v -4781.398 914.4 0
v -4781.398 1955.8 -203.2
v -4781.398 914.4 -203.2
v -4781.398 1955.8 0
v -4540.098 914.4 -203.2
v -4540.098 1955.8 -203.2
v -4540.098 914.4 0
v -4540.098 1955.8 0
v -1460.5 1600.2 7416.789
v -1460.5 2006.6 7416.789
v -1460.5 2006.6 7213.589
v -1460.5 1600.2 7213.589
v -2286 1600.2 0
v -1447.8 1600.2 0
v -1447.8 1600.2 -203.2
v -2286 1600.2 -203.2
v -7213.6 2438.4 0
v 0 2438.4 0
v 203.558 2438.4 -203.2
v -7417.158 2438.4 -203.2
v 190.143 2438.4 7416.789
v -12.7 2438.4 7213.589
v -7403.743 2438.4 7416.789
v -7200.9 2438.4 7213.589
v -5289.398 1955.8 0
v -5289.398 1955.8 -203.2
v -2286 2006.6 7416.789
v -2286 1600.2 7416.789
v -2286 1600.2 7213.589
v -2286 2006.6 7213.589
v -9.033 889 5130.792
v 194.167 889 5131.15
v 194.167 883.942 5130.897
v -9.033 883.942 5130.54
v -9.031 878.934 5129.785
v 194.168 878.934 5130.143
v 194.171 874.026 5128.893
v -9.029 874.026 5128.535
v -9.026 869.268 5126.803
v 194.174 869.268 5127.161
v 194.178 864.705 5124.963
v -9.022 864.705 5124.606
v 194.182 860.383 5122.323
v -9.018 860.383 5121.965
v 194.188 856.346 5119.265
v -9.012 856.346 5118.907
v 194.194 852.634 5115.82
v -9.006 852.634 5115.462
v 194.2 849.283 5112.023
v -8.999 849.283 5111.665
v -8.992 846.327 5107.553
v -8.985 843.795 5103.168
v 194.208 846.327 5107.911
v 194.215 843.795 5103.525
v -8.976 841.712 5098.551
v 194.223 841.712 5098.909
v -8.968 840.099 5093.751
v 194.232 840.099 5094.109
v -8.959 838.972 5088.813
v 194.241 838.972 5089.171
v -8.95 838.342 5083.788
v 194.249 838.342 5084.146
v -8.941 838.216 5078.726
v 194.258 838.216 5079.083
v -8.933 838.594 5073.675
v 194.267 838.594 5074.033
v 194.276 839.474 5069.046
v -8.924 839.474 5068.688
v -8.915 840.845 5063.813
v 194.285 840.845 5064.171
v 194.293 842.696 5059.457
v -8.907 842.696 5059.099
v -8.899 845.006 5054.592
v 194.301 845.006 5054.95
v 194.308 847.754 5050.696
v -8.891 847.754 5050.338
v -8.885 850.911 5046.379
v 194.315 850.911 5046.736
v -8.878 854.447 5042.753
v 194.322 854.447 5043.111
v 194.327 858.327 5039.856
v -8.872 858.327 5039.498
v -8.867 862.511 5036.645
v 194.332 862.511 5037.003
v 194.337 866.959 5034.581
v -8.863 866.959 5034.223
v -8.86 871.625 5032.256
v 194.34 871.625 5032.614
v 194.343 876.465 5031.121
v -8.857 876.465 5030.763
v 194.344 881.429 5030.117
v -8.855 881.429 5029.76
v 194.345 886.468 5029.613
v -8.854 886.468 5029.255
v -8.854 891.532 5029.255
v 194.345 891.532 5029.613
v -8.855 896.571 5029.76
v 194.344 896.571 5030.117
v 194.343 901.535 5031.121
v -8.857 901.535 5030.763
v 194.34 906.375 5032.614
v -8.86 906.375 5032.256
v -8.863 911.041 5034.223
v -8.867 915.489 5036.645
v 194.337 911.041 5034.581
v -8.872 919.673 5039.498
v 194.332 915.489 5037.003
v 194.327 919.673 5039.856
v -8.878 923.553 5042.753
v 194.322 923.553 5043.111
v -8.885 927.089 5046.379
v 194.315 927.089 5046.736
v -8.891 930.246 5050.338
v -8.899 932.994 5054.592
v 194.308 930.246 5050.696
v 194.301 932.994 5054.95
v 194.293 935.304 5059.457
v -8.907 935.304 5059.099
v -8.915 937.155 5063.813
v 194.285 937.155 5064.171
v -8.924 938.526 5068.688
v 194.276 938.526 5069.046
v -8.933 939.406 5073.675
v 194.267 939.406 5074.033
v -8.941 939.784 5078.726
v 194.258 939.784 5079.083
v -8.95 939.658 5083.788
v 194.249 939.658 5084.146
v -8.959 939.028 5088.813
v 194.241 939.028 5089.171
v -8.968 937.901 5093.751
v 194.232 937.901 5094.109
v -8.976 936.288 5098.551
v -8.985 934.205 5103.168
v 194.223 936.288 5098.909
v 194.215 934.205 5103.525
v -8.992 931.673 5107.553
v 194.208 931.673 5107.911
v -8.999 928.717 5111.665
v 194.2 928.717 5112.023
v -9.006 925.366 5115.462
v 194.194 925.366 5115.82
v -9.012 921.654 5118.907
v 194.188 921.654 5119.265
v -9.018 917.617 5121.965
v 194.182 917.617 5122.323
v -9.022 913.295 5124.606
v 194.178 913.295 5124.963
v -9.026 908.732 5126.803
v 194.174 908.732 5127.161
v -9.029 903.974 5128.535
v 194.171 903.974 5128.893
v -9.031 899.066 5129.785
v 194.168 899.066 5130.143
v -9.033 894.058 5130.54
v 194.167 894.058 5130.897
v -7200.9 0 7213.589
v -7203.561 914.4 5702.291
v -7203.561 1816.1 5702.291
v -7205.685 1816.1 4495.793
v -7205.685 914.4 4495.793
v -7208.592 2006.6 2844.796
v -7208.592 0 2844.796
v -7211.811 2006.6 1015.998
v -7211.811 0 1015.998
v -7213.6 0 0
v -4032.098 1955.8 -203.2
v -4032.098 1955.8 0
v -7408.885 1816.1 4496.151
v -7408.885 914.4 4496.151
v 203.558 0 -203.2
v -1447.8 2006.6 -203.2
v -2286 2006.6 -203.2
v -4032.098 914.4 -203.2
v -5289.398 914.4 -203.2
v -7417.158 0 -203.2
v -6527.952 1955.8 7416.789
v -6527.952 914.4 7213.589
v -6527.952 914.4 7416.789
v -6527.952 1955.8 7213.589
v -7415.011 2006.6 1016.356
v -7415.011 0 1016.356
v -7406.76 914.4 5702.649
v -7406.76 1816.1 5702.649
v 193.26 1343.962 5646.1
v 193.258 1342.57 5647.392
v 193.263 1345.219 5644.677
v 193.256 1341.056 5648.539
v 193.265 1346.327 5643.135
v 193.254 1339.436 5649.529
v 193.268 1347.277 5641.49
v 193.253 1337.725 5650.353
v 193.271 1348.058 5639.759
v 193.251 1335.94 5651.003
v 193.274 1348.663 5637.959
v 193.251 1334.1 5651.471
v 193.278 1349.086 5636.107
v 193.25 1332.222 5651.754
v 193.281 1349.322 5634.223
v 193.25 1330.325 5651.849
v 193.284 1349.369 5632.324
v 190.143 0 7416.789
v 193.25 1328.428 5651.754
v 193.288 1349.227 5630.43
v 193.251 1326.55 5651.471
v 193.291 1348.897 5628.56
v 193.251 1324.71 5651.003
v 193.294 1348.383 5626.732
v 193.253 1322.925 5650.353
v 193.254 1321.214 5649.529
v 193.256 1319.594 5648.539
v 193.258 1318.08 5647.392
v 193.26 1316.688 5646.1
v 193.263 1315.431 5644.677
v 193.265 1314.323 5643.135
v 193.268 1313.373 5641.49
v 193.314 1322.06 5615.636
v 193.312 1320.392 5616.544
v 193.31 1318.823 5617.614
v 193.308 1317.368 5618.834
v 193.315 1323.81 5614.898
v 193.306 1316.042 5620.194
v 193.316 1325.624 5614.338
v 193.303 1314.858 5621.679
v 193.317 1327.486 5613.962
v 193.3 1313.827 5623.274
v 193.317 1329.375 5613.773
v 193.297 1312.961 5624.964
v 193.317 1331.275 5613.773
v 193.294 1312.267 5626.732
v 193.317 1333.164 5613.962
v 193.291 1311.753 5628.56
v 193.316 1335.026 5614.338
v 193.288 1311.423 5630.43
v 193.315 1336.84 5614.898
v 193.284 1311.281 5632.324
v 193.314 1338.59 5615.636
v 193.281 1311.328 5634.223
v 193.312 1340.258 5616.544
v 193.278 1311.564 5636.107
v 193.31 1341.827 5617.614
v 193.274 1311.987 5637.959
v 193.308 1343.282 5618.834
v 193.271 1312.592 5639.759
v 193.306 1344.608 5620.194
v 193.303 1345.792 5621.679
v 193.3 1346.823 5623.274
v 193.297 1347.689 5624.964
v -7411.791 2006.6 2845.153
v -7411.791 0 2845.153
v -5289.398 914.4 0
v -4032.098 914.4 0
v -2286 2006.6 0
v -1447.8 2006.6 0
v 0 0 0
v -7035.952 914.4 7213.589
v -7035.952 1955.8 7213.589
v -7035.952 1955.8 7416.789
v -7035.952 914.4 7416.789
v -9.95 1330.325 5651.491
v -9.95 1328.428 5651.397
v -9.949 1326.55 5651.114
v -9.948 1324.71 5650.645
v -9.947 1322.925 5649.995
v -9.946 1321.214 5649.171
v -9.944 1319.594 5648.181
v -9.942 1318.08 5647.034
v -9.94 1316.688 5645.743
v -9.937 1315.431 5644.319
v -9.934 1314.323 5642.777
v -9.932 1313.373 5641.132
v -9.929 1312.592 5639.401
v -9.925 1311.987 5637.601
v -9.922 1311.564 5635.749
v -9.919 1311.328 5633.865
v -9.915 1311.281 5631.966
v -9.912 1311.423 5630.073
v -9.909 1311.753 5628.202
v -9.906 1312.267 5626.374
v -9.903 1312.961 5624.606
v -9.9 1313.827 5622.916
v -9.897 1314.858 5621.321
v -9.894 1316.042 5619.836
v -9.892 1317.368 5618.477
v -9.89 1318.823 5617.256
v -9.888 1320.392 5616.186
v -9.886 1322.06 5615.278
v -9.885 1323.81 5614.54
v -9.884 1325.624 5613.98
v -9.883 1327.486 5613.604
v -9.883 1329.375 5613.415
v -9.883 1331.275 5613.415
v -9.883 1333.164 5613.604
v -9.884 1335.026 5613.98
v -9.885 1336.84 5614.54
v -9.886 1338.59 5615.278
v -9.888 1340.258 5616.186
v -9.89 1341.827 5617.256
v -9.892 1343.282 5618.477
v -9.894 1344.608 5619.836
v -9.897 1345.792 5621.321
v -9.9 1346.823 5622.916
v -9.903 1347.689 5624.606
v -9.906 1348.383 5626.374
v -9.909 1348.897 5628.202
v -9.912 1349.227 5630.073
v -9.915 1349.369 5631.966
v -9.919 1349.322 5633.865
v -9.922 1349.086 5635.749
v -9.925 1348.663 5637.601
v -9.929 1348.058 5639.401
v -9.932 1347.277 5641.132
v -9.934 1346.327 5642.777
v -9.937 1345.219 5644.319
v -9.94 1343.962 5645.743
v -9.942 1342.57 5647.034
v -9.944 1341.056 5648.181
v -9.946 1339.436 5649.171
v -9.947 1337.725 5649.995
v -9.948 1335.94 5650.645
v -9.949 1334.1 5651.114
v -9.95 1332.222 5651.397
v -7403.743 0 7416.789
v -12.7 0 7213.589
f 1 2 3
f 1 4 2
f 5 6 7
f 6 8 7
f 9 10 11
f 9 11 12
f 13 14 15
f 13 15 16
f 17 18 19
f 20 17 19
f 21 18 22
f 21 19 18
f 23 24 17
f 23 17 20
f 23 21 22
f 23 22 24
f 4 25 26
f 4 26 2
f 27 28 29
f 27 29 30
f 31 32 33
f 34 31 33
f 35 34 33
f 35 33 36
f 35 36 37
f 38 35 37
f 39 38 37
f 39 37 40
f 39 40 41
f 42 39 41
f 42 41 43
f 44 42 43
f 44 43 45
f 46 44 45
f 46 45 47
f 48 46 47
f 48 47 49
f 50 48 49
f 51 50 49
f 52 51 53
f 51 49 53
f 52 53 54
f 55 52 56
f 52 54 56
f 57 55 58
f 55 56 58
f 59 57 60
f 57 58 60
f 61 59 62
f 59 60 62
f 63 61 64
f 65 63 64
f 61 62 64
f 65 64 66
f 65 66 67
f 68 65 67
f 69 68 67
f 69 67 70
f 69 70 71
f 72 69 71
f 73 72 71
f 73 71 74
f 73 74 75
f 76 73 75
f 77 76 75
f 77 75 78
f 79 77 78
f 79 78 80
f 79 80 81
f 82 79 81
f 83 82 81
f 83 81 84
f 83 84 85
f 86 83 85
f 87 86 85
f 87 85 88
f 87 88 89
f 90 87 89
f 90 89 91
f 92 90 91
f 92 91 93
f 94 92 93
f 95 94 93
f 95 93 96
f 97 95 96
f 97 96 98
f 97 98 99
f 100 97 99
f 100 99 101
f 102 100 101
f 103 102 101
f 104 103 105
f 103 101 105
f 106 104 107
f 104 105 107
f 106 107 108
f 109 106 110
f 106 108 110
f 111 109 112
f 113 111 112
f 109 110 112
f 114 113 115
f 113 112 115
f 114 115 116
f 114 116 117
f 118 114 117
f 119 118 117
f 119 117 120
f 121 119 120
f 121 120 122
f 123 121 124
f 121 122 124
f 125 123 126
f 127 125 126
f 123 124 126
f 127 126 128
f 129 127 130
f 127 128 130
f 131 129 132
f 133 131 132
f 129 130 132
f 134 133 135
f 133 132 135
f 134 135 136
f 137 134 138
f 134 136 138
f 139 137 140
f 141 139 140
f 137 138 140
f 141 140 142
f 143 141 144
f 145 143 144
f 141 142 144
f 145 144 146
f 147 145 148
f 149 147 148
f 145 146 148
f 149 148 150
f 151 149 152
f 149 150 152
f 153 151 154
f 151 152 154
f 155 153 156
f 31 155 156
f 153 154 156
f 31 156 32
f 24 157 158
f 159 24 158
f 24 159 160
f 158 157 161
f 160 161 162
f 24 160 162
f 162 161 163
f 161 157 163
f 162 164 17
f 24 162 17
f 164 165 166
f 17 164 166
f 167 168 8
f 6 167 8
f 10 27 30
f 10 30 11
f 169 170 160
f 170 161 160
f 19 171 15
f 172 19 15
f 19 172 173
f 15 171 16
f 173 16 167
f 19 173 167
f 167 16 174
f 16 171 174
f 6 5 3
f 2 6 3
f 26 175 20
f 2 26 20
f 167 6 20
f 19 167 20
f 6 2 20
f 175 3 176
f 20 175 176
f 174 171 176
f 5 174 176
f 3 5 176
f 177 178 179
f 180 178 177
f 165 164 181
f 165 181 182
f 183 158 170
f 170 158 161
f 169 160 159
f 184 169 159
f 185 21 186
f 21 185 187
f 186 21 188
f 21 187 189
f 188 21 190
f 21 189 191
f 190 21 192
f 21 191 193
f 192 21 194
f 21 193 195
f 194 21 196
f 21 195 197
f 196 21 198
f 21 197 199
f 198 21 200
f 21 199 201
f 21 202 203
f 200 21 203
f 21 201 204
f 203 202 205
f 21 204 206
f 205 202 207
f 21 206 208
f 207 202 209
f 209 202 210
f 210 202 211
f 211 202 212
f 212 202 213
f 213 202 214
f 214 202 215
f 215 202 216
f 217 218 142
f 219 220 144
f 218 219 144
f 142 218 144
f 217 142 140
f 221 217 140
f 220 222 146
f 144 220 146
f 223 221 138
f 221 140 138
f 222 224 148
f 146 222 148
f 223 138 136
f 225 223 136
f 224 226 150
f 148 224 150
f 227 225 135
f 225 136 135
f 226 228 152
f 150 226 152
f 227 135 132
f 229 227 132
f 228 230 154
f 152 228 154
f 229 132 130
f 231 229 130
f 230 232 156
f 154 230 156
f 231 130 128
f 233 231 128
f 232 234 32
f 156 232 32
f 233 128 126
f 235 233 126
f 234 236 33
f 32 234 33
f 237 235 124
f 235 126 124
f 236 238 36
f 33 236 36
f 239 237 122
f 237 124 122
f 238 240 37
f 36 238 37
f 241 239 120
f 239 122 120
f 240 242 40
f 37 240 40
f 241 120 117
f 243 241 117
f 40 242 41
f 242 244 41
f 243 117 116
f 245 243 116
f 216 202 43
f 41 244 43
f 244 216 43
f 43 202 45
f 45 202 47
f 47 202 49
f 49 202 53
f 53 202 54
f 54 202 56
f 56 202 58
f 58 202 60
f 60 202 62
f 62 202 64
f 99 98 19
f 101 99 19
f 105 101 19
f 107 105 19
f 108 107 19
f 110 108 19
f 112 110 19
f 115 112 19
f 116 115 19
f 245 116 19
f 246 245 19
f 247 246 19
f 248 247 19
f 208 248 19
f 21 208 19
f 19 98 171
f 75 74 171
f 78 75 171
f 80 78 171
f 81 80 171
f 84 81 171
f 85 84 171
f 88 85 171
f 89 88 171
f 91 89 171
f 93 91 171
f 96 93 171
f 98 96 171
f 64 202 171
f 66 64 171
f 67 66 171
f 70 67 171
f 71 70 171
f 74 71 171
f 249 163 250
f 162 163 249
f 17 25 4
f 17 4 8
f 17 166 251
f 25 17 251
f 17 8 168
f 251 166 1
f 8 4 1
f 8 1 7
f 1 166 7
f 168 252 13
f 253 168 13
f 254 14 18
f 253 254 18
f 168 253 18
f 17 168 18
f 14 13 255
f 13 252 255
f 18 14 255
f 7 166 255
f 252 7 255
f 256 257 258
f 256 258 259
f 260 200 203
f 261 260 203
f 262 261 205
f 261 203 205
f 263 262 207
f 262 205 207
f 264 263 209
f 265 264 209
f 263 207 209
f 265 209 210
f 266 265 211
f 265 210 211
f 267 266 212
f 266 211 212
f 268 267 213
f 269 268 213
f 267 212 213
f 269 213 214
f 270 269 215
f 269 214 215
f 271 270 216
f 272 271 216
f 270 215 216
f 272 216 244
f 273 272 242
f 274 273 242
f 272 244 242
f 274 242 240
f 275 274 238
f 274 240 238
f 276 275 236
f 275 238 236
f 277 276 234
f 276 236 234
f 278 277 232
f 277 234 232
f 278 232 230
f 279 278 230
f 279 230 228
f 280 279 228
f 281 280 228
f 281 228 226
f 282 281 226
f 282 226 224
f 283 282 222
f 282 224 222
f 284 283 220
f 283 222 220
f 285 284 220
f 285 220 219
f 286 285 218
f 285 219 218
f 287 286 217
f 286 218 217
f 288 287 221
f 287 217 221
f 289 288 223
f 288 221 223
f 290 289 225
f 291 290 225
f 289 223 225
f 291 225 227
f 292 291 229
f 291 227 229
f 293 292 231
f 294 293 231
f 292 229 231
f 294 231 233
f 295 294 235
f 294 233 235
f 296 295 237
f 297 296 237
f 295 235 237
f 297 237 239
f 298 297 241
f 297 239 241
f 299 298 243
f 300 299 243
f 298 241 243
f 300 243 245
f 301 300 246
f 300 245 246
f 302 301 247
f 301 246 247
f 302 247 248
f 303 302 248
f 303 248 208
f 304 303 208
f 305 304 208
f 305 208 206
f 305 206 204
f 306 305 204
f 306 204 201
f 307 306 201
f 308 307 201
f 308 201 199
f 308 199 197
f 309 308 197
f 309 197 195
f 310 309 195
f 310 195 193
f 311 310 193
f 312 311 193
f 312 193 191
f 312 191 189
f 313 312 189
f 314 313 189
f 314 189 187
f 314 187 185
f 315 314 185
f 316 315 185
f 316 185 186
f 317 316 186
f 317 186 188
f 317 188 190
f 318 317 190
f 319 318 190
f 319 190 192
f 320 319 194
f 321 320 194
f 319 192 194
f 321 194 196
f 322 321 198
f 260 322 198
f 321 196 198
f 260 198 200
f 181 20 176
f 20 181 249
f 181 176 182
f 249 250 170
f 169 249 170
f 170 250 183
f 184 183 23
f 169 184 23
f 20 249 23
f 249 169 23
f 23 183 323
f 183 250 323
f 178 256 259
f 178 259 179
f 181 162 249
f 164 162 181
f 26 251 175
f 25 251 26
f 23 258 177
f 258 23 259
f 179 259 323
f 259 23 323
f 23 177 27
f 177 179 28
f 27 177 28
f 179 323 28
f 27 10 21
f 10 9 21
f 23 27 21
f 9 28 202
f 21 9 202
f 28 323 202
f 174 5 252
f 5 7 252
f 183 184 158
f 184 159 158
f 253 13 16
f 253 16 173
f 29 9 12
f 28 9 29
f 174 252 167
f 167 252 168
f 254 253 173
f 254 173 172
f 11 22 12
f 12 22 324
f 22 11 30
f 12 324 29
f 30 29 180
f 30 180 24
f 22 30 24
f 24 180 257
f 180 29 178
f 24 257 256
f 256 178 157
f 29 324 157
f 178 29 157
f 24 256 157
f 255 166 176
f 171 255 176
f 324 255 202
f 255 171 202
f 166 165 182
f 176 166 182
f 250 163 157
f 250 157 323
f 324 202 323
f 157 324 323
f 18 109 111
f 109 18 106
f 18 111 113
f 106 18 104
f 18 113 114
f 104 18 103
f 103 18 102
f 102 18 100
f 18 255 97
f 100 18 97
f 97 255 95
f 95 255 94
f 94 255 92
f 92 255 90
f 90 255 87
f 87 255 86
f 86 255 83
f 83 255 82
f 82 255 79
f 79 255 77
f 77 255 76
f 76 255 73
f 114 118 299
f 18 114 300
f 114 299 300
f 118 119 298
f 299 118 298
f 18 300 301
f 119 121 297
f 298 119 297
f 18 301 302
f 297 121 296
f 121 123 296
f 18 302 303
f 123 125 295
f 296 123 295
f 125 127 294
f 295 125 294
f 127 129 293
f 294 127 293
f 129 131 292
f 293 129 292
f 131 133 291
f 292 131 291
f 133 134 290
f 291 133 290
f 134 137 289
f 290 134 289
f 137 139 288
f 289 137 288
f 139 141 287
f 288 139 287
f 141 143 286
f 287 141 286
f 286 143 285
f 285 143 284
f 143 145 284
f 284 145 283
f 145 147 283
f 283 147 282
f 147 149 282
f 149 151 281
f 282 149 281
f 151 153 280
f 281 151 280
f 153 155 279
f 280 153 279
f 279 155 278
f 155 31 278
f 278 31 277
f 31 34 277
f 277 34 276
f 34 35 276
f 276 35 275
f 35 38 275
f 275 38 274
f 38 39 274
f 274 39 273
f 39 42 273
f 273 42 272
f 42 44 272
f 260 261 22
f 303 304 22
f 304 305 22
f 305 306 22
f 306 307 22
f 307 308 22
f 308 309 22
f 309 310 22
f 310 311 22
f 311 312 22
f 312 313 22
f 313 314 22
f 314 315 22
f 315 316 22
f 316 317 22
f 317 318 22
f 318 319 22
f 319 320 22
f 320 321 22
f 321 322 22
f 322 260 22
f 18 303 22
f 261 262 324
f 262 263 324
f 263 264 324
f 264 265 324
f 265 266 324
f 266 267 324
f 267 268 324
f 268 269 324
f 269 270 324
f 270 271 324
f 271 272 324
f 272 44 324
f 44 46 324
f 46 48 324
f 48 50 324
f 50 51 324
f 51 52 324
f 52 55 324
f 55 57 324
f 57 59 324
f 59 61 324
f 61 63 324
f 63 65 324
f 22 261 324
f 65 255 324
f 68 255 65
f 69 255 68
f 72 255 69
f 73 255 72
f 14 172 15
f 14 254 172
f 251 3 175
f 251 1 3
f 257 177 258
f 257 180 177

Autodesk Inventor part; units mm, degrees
ref_plane "YZ Plane" through (0, 0, 0) normal (1, 0, 0) x (0, 1, 0)
ref_plane "XZ Plane" through (0, 0, 0) normal (0, 1, 0) x (-1, 0, 0)
ref_plane "XY Plane" through (0, 0, 0) normal (0, 0, 1) x (1, 0, 0)
sketch "Sketch1" plane through (0, 0, 0) normal (0, 1, 0) x (-1, 0, 0)
  line L0 (0, 0) -> (12.7, 7213.5888)
  line L1 (12.7, 7213.5888) -> (7200.9, 7213.5888)
  line L2 (7200.9, 7213.5888) -> (7213.6, 0)
  line L3 (7213.6, 0) -> (0, 0)
  line L4 (7403.7426, 7416.7888) -> (-190.1426, 7416.7888)
  line L5 (-190.1426, 7416.7888) -> (-203.5581, -203.2)
  line L6 (-203.5581, -203.2) -> (7417.1581, -203.2)
  line L7 (7417.1581, -203.2) -> (7403.7426, 7416.7888)
  dimension "d1" = 7188.2
  dimension "d3" = 12.7
  dimension "d4" = 7213.6
  dimension "d5" = 7213.6
  dimension "d6" = 203.2
  dimension "d8" = 7213.6
extrude "Extrusion1" add sketch "Sketch1" along normal blind 2438.4
sketch "Sketch4" plane through (-12.7, 0, 7213.5888) normal (-0.9999985, 0, -0.0017606) x (-0.0017606, 0, 0.9999985)
  line L0 (-7213.6, 0) -> (0, 0) projected
  line L1 (-7213.6, 0) -> (-7213.6, 2438.4) projected
  line L2 (0, 0) -> (0, 2438.4) projected
  point P0 (-1581.15, 1330.325)
  dimension "d27" = 1330.325
  dimension "d139" = 1581.15
hole "Hole1" at (-9.9163, 1330.325, 5632.4413) direction (0.9999985, 0, 0.0017606) diameter 38.1 end through all
sketch "Sketch5" plane through (-12.7, 0, 7213.5888) normal (-0.9999985, 0, -0.0017606) x (-0.0017606, 0, 0.9999985)
  line L0 (-7213.6, 0) -> (0, 0) projected
  line L1 (-7213.6, 0) -> (-7213.6, 2438.4) projected
  point P0 (-2133.6, 889)
  dimension "d36" = 889
  dimension "d37" = 5080
hole "Hole2" at (-8.9437, 889, 5079.9921) direction (0.9999985, 0, 0.0017606) diameter 101.6 end through all
sketch "Sketch6" plane through (-7213.6, 0, 0) normal (0, 0, 1) x (1, 0, 0)
  line L0 (7417.1581, 2438.4) -> (-203.5581, 2438.4) projected
  line L1 (7213.6, 0) -> (7213.6, 2438.4) projected
  line L2 (0, 0) -> (7213.6, 0) projected
  line L3 (4927.6, 2006.6) -> (5765.8, 2006.6)
  line L4 (5765.8, 2006.6) -> (5765.8, 1600.2)
  line L5 (5765.8, 1600.2) -> (4927.6, 1600.2)
  line L6 (4927.6, 1600.2) -> (4927.6, 2006.6)
  dimension "d119" = 1447.8
  dimension "d121" = 406.4
  dimension "d136" = 838.2
  dimension "d137" = 1600.2
extrude "Extrusion3" cut sketch "Sketch6" against normal up to surface (203.2 mm away)
sketch "Sketch7" plane through (-7213.6, 0, 0) normal (0.9999985, 0, -0.0017606) x (-0.0017606, 0, -0.9999985)
  line L0 (-7213.6, 0) -> (0, 0) projected
  line L1 (-1016, 0) -> (-2844.8, 0)
  line L2 (-2844.8, 0) -> (-2844.8, 2006.6)
  line L3 (-2844.8, 2006.6) -> (-1016, 2006.6)
  line L4 (-1016, 2006.6) -> (-1016, 0)
  line L5 (0, 0) -> (0, 2438.4) projected
  point P0 (-12.7, 0)
  point P1 (-2844.8, 0)
  dimension "d51" = 1016
  dimension "d52" = 2006.6
  dimension "d53" = 1828.8
extrude "Extrusion4" cut sketch "Sketch7" against normal up to surface (203.2 mm away)
sketch "Sketch8" plane through (-7200.9, 0, 7213.5888) normal (0.9999985, 0, -0.0017606) x (-0.0017606, 0, -0.9999985)
  line L0 (2717.8, 1816.1) -> (1511.3, 1816.1)
  line L1 (1511.3, 1816.1) -> (1511.3, 914.4)
  line L2 (1511.3, 914.4) -> (2717.8, 914.4)
  line L3 (2717.8, 914.4) -> (2717.8, 1816.1)
  line L4 (0, 0) -> (0, 2438.4) projected
  line L5 (0, 0) -> (4368.8, 0) projected
  point P0 (7200.9, 0)
  dimension "d56" = 2717.8
  dimension "d57" = 1206.5
  dimension "d58" = 901.7
  dimension "d59" = 914.4
extrude "Extrusion5" cut sketch "Sketch8" against normal up to surface (203.2 mm away)
sketch "Sketch9" plane through (-7213.6, 0, 0) normal (0, 0, 1) x (1, 0, 0)
  line L0 (3181.5024, 1955.8) -> (2673.5024, 1955.8)
  line L1 (2673.5024, 1955.8) -> (2673.5024, 914.4)
  line L2 (2673.5024, 914.4) -> (3181.5024, 914.4)
  line L3 (3181.5024, 914.4) -> (3181.5024, 1955.8)
  line L4 (0, 0) -> (7213.6, 0) projected
  line L5 (7213.6, 0) -> (7213.6, 2438.4) projected
  dimension "d63" = 1041.4
  dimension "d64" = 508
  dimension "d65" = 914.4
  dimension "d66" = 4540.0976
extrude "Extrusion6" cut sketch "Sketch9" against normal up to surface (203.2 mm away)
sketch "Sketch10" plane through (-7213.6, 0, 0) normal (0, 0, 1) x (1, 0, 0)
  line L0 (2432.2024, 914.4) -> (1924.2024, 914.4)
  line L1 (1924.2024, 914.4) -> (1924.2024, 1955.8)
  line L2 (1924.2024, 1955.8) -> (2432.2024, 1955.8)
  line L3 (2432.2024, 1955.8) -> (2432.2024, 914.4)
  line L4 (0, 0) -> (7213.6, 0) projected
  line L5 (0, 0) -> (0, 2438.4) projected
  dimension "d69" = 914.4
  dimension "d70" = 1041.4
  dimension "d71" = 508
  dimension "d72" = 1924.2024
extrude "Extrusion7" cut sketch "Sketch10" against normal up to surface (203.2 mm away)
sketch "Sketch11" plane through (-12.7, 0, 7213.5888) normal (0, 0, -1) x (-1, 0, 0)
  line L0 (7023.2524, 914.4) -> (6515.2524, 914.4)
  line L1 (6515.2524, 914.4) -> (6515.2524, 1955.8)
  line L2 (6515.2524, 1955.8) -> (7023.2524, 1955.8)
  line L3 (7023.2524, 1955.8) -> (7023.2524, 914.4)
  line L4 (7188.2, 0) -> (7188.2, 2438.4) projected
  line L5 (0, 0) -> (7188.2, 0) projected
  point P0 (-12.7, 0)
  dimension "d75" = 164.9476
  dimension "d76" = 1041.4
  dimension "d79" = 508
  dimension "d80" = 914.4
extrude "Extrusion8" cut sketch "Sketch11" against normal up to surface (203.2 mm away)
sketch "Sketch20" plane through (-7403.7426, 0, 7416.7888) normal (0, 0, 1) x (1, 0, 0)
  line L0 (5117.7426, 2006.6) -> (5943.2426, 2006.6)
  line L1 (5943.2426, 2006.6) -> (5943.2426, 1600.2)
  line L2 (5943.2426, 1600.2) -> (5117.7426, 1600.2)
  line L3 (5117.7426, 1600.2) -> (5117.7426, 2006.6)
  line L4 (0, 2438.4) -> (7593.8851, 2438.4) projected
  line L5 (0, 0) -> (7593.8851, 0) projected
  point P0 (7403.7426, 0)
  point P1 (7391.0426, 2438.4)
  dimension "d129" = 406.4
  dimension "d134" = 825.5
  dimension "d135" = 1600.2
  dimension "d138" = 1447.8
extrude "Extrusion16" cut sketch "Sketch20" against normal up to surface (203.2 mm away)
properties part number "Exterior_Walls" material "Concrete"
